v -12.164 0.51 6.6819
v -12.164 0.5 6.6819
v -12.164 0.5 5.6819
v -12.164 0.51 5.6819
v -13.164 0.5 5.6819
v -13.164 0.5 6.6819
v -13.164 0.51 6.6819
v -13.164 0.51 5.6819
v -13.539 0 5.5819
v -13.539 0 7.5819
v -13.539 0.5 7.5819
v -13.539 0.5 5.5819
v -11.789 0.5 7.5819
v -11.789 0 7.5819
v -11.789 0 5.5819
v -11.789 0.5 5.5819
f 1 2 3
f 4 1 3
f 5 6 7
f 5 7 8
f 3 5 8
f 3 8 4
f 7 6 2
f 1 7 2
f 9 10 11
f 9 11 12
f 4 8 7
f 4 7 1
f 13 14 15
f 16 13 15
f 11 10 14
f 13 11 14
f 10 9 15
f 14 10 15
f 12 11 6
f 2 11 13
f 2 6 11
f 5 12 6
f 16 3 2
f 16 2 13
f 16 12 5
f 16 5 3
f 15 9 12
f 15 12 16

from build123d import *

# Parameters (mm, degrees)
SCHIZZO1_W                   = 1.75
SCHIZZO1_H                   = 2
ESTRUSIONE_ESTRUSIONE1_DEPTH = 0.5
SCHIZZO2_W                   = 1
SCHIZZO2_H                   = 1
ESTRUSIONE_ESTRUSIONE2_DEPTH = 0.01


with BuildPart() as part:
    # Schizzo1 → Estrusione-Estrusione1 (new body)
    with BuildSketch(Plane(origin=(0, 0, 0), x_dir=(1, 0, 0), z_dir=(0, 1, 0))):
        with Locations((-12.664027306, -6.581855291)):
            Rectangle(SCHIZZO1_W, SCHIZZO1_H)
    extrude(amount=ESTRUSIONE_ESTRUSIONE1_DEPTH)

    # Schizzo2 → Estrusione-Estrusione2 (add)
    with BuildSketch(Plane(origin=(0, 0.5, 0), x_dir=(1, 0, 0), z_dir=(0, 1, 0))):
        with Locations((-12.664027306, -6.181855291)):
            Rectangle(SCHIZZO2_W, SCHIZZO2_H)
    extrude(amount=ESTRUSIONE_ESTRUSIONE2_DEPTH)


solid = part.part
